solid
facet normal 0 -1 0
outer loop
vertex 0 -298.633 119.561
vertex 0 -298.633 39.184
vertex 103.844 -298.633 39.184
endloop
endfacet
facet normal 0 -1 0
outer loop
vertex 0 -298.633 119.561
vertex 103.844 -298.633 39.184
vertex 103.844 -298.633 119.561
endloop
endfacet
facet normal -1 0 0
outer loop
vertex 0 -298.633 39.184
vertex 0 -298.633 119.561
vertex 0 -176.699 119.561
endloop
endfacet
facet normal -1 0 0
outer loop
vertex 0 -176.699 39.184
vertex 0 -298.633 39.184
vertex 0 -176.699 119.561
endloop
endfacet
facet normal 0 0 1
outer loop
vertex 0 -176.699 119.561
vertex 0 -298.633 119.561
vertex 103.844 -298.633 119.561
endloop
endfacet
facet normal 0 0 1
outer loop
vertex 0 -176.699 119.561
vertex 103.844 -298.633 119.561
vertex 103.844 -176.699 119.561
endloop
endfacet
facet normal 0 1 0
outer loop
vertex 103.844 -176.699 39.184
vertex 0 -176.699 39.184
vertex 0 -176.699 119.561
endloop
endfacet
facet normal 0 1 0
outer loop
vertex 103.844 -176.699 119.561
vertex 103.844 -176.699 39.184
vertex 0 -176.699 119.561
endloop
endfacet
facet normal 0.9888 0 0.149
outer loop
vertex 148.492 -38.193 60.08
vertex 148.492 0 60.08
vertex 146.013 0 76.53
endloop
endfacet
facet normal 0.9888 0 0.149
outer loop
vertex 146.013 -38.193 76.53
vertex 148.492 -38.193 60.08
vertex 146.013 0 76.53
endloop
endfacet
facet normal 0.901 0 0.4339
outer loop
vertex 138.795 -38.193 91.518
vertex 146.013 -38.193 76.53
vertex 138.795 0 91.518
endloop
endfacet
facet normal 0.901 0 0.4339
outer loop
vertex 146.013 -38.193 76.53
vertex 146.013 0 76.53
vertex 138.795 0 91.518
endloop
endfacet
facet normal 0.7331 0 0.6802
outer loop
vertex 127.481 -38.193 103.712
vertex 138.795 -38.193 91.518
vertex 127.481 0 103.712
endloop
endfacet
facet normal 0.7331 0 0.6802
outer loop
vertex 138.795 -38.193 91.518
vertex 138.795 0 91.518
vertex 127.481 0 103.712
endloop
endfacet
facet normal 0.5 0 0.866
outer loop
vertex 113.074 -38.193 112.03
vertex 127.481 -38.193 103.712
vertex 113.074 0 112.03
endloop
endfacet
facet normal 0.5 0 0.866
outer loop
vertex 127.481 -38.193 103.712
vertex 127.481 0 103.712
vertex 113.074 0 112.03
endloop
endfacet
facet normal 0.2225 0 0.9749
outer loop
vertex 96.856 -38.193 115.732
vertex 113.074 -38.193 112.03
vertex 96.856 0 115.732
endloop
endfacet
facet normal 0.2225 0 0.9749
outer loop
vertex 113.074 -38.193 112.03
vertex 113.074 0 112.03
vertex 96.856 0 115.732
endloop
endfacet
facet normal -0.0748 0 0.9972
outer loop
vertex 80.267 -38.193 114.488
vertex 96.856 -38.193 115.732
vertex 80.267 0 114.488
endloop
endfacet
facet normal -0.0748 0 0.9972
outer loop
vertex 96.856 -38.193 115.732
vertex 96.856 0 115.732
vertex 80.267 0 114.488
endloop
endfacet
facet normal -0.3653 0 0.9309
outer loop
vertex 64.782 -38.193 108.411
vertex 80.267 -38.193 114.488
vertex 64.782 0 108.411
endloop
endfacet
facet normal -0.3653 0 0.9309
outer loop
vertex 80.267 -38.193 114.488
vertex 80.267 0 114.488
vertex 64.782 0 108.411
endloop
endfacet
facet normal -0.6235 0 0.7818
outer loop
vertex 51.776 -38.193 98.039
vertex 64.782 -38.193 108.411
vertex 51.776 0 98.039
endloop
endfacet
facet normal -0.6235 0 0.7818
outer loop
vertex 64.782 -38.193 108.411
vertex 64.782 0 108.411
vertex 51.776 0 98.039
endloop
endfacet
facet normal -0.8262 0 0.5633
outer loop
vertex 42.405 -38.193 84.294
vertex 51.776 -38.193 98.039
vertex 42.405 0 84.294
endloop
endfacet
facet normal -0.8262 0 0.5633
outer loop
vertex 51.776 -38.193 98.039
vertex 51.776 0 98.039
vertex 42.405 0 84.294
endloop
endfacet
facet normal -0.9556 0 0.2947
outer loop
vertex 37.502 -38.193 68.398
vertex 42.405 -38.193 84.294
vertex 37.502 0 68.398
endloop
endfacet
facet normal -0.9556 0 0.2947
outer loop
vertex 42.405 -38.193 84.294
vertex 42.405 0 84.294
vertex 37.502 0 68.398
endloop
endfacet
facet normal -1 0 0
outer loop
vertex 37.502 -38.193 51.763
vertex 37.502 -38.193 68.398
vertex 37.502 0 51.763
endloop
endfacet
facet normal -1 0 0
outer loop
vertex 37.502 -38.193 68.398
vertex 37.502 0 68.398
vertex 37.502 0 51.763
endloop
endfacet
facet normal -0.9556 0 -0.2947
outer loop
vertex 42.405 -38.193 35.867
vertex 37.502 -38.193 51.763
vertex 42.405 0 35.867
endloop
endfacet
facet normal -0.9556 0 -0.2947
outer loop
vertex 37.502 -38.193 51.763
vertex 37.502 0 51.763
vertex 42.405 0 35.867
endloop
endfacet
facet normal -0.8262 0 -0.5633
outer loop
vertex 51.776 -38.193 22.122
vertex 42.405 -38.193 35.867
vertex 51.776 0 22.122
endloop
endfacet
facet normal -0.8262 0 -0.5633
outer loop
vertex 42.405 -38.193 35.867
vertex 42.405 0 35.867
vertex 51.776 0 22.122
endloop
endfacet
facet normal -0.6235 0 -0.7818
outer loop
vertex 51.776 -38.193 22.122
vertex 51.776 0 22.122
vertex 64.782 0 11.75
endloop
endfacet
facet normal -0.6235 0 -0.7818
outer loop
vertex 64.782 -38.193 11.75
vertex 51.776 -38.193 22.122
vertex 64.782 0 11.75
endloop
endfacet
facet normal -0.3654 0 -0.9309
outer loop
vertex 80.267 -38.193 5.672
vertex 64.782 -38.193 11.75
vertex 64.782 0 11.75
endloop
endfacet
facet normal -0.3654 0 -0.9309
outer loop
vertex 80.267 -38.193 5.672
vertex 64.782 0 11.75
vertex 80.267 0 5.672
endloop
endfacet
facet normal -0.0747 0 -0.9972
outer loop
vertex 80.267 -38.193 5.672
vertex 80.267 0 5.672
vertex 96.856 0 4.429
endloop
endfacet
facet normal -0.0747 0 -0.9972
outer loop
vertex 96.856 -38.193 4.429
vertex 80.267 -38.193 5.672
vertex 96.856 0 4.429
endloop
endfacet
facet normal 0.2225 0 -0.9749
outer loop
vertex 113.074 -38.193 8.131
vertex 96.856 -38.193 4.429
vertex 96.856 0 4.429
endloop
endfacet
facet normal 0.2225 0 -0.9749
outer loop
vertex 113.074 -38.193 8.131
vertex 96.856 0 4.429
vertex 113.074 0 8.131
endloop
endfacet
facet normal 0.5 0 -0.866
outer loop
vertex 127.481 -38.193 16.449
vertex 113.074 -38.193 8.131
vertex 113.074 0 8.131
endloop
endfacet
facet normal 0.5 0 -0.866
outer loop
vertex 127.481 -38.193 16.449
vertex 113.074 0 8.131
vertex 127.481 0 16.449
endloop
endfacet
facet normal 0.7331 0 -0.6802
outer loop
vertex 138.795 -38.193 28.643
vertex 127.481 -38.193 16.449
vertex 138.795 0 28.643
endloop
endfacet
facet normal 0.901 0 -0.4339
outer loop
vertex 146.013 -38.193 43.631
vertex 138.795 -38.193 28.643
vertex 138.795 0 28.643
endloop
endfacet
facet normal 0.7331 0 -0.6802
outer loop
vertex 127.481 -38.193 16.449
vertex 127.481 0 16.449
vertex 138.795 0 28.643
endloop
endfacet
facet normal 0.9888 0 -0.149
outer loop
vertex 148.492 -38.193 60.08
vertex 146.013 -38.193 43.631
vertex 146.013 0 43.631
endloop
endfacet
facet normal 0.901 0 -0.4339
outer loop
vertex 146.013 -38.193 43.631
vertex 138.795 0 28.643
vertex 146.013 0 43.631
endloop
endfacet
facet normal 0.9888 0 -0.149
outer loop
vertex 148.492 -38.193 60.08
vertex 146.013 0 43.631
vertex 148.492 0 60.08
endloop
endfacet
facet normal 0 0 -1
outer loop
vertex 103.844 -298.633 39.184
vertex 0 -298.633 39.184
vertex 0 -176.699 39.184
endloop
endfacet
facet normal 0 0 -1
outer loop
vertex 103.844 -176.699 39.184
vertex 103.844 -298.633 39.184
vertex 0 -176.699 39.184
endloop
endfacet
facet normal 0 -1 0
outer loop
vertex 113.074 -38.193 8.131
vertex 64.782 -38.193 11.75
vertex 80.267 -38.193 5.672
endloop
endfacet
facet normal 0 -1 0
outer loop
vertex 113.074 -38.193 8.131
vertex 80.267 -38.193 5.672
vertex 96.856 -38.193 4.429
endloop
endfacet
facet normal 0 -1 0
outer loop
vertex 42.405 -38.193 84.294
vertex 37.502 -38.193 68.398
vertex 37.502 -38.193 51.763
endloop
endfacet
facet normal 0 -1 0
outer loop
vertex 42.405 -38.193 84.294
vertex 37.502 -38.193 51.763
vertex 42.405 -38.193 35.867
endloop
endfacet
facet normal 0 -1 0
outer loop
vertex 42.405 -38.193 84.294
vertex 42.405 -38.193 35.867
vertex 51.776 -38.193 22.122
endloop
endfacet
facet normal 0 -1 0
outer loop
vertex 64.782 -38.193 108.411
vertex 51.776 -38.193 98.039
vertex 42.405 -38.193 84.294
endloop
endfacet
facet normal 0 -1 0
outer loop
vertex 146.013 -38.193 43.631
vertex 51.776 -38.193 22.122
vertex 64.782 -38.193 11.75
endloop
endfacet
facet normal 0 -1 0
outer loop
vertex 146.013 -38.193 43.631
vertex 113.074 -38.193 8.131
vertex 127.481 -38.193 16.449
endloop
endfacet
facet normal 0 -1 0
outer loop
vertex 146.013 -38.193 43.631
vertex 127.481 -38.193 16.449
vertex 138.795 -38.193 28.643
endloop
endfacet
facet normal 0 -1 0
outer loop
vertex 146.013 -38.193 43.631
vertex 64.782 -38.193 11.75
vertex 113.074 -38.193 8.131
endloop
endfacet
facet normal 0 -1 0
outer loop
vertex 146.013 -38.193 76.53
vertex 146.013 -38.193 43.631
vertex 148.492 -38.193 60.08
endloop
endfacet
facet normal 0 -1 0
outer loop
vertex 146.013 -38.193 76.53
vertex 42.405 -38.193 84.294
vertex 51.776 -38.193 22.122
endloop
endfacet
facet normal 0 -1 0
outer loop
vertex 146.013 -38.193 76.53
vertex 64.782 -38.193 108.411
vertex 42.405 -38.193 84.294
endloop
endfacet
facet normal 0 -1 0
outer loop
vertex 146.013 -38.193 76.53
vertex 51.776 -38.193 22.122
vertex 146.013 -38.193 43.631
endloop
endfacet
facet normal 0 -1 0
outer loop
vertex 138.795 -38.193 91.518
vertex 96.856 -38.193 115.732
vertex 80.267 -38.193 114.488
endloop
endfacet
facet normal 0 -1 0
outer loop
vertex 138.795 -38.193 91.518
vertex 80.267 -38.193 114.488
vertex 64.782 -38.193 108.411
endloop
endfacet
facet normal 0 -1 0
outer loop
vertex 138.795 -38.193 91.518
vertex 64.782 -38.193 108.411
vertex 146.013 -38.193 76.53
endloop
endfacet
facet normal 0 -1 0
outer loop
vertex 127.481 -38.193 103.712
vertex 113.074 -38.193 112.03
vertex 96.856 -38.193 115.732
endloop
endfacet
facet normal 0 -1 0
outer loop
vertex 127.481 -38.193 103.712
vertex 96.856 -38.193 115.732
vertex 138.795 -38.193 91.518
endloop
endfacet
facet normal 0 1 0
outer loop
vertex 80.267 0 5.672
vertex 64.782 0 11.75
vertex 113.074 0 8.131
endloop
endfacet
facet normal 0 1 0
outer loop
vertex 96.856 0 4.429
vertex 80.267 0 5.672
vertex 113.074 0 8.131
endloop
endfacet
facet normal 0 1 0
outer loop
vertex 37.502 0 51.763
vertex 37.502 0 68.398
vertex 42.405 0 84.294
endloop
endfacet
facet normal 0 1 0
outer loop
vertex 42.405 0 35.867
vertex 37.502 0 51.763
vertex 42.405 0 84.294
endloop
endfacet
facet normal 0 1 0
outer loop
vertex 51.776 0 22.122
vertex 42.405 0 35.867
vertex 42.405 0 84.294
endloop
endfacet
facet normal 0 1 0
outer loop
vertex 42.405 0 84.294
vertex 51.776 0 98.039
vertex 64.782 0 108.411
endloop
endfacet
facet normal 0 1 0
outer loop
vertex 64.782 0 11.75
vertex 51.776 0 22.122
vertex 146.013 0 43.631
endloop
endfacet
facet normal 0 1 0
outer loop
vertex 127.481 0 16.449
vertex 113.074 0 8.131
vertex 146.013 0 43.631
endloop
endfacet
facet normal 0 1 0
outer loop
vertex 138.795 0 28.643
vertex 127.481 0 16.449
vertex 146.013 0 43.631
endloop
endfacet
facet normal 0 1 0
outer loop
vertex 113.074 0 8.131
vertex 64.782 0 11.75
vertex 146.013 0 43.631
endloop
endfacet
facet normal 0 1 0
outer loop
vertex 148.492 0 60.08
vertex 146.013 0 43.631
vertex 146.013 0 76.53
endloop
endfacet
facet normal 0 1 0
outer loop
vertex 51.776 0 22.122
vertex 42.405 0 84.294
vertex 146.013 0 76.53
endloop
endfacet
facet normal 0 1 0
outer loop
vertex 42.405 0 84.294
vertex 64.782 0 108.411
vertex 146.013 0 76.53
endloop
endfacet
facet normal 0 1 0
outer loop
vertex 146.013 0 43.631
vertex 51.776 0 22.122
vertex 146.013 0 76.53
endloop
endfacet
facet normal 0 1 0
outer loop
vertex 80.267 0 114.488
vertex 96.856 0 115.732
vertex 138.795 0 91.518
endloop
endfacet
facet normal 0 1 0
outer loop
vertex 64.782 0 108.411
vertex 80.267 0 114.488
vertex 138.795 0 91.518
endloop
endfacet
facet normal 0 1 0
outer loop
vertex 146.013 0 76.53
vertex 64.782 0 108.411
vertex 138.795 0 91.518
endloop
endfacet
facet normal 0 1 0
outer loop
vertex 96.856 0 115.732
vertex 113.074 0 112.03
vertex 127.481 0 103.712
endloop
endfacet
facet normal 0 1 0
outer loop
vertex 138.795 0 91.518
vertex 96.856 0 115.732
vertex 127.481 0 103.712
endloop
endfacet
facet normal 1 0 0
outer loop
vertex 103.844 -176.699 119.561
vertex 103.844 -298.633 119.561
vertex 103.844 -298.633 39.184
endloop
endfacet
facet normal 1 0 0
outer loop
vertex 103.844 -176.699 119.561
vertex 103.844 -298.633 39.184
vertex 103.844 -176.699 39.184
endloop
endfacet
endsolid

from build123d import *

# Parameters (mm, degrees)
F0_W     = 121.933609
F0_H     = 80.376893
F1_DEPTH = 103.84442
F2_R     = 55.807142
F3_DEPTH = 38.19328


with BuildPart() as f1:
    # F0 (on Right) → F1 (new body)
    with BuildSketch(Plane.YZ):
        with Locations((-237.665906, 79.372234)):
            Rectangle(F0_W, F0_H)
    extrude(amount=F1_DEPTH)


with BuildPart() as f3:
    # F2 (on Front) → F3 (new body)
    with BuildSketch(Plane.XZ):
        with Locations((92.685357, 60.080417)):
            Circle(F2_R)
    extrude(amount=F3_DEPTH)


solid = Compound([f1.part, f3.part])
